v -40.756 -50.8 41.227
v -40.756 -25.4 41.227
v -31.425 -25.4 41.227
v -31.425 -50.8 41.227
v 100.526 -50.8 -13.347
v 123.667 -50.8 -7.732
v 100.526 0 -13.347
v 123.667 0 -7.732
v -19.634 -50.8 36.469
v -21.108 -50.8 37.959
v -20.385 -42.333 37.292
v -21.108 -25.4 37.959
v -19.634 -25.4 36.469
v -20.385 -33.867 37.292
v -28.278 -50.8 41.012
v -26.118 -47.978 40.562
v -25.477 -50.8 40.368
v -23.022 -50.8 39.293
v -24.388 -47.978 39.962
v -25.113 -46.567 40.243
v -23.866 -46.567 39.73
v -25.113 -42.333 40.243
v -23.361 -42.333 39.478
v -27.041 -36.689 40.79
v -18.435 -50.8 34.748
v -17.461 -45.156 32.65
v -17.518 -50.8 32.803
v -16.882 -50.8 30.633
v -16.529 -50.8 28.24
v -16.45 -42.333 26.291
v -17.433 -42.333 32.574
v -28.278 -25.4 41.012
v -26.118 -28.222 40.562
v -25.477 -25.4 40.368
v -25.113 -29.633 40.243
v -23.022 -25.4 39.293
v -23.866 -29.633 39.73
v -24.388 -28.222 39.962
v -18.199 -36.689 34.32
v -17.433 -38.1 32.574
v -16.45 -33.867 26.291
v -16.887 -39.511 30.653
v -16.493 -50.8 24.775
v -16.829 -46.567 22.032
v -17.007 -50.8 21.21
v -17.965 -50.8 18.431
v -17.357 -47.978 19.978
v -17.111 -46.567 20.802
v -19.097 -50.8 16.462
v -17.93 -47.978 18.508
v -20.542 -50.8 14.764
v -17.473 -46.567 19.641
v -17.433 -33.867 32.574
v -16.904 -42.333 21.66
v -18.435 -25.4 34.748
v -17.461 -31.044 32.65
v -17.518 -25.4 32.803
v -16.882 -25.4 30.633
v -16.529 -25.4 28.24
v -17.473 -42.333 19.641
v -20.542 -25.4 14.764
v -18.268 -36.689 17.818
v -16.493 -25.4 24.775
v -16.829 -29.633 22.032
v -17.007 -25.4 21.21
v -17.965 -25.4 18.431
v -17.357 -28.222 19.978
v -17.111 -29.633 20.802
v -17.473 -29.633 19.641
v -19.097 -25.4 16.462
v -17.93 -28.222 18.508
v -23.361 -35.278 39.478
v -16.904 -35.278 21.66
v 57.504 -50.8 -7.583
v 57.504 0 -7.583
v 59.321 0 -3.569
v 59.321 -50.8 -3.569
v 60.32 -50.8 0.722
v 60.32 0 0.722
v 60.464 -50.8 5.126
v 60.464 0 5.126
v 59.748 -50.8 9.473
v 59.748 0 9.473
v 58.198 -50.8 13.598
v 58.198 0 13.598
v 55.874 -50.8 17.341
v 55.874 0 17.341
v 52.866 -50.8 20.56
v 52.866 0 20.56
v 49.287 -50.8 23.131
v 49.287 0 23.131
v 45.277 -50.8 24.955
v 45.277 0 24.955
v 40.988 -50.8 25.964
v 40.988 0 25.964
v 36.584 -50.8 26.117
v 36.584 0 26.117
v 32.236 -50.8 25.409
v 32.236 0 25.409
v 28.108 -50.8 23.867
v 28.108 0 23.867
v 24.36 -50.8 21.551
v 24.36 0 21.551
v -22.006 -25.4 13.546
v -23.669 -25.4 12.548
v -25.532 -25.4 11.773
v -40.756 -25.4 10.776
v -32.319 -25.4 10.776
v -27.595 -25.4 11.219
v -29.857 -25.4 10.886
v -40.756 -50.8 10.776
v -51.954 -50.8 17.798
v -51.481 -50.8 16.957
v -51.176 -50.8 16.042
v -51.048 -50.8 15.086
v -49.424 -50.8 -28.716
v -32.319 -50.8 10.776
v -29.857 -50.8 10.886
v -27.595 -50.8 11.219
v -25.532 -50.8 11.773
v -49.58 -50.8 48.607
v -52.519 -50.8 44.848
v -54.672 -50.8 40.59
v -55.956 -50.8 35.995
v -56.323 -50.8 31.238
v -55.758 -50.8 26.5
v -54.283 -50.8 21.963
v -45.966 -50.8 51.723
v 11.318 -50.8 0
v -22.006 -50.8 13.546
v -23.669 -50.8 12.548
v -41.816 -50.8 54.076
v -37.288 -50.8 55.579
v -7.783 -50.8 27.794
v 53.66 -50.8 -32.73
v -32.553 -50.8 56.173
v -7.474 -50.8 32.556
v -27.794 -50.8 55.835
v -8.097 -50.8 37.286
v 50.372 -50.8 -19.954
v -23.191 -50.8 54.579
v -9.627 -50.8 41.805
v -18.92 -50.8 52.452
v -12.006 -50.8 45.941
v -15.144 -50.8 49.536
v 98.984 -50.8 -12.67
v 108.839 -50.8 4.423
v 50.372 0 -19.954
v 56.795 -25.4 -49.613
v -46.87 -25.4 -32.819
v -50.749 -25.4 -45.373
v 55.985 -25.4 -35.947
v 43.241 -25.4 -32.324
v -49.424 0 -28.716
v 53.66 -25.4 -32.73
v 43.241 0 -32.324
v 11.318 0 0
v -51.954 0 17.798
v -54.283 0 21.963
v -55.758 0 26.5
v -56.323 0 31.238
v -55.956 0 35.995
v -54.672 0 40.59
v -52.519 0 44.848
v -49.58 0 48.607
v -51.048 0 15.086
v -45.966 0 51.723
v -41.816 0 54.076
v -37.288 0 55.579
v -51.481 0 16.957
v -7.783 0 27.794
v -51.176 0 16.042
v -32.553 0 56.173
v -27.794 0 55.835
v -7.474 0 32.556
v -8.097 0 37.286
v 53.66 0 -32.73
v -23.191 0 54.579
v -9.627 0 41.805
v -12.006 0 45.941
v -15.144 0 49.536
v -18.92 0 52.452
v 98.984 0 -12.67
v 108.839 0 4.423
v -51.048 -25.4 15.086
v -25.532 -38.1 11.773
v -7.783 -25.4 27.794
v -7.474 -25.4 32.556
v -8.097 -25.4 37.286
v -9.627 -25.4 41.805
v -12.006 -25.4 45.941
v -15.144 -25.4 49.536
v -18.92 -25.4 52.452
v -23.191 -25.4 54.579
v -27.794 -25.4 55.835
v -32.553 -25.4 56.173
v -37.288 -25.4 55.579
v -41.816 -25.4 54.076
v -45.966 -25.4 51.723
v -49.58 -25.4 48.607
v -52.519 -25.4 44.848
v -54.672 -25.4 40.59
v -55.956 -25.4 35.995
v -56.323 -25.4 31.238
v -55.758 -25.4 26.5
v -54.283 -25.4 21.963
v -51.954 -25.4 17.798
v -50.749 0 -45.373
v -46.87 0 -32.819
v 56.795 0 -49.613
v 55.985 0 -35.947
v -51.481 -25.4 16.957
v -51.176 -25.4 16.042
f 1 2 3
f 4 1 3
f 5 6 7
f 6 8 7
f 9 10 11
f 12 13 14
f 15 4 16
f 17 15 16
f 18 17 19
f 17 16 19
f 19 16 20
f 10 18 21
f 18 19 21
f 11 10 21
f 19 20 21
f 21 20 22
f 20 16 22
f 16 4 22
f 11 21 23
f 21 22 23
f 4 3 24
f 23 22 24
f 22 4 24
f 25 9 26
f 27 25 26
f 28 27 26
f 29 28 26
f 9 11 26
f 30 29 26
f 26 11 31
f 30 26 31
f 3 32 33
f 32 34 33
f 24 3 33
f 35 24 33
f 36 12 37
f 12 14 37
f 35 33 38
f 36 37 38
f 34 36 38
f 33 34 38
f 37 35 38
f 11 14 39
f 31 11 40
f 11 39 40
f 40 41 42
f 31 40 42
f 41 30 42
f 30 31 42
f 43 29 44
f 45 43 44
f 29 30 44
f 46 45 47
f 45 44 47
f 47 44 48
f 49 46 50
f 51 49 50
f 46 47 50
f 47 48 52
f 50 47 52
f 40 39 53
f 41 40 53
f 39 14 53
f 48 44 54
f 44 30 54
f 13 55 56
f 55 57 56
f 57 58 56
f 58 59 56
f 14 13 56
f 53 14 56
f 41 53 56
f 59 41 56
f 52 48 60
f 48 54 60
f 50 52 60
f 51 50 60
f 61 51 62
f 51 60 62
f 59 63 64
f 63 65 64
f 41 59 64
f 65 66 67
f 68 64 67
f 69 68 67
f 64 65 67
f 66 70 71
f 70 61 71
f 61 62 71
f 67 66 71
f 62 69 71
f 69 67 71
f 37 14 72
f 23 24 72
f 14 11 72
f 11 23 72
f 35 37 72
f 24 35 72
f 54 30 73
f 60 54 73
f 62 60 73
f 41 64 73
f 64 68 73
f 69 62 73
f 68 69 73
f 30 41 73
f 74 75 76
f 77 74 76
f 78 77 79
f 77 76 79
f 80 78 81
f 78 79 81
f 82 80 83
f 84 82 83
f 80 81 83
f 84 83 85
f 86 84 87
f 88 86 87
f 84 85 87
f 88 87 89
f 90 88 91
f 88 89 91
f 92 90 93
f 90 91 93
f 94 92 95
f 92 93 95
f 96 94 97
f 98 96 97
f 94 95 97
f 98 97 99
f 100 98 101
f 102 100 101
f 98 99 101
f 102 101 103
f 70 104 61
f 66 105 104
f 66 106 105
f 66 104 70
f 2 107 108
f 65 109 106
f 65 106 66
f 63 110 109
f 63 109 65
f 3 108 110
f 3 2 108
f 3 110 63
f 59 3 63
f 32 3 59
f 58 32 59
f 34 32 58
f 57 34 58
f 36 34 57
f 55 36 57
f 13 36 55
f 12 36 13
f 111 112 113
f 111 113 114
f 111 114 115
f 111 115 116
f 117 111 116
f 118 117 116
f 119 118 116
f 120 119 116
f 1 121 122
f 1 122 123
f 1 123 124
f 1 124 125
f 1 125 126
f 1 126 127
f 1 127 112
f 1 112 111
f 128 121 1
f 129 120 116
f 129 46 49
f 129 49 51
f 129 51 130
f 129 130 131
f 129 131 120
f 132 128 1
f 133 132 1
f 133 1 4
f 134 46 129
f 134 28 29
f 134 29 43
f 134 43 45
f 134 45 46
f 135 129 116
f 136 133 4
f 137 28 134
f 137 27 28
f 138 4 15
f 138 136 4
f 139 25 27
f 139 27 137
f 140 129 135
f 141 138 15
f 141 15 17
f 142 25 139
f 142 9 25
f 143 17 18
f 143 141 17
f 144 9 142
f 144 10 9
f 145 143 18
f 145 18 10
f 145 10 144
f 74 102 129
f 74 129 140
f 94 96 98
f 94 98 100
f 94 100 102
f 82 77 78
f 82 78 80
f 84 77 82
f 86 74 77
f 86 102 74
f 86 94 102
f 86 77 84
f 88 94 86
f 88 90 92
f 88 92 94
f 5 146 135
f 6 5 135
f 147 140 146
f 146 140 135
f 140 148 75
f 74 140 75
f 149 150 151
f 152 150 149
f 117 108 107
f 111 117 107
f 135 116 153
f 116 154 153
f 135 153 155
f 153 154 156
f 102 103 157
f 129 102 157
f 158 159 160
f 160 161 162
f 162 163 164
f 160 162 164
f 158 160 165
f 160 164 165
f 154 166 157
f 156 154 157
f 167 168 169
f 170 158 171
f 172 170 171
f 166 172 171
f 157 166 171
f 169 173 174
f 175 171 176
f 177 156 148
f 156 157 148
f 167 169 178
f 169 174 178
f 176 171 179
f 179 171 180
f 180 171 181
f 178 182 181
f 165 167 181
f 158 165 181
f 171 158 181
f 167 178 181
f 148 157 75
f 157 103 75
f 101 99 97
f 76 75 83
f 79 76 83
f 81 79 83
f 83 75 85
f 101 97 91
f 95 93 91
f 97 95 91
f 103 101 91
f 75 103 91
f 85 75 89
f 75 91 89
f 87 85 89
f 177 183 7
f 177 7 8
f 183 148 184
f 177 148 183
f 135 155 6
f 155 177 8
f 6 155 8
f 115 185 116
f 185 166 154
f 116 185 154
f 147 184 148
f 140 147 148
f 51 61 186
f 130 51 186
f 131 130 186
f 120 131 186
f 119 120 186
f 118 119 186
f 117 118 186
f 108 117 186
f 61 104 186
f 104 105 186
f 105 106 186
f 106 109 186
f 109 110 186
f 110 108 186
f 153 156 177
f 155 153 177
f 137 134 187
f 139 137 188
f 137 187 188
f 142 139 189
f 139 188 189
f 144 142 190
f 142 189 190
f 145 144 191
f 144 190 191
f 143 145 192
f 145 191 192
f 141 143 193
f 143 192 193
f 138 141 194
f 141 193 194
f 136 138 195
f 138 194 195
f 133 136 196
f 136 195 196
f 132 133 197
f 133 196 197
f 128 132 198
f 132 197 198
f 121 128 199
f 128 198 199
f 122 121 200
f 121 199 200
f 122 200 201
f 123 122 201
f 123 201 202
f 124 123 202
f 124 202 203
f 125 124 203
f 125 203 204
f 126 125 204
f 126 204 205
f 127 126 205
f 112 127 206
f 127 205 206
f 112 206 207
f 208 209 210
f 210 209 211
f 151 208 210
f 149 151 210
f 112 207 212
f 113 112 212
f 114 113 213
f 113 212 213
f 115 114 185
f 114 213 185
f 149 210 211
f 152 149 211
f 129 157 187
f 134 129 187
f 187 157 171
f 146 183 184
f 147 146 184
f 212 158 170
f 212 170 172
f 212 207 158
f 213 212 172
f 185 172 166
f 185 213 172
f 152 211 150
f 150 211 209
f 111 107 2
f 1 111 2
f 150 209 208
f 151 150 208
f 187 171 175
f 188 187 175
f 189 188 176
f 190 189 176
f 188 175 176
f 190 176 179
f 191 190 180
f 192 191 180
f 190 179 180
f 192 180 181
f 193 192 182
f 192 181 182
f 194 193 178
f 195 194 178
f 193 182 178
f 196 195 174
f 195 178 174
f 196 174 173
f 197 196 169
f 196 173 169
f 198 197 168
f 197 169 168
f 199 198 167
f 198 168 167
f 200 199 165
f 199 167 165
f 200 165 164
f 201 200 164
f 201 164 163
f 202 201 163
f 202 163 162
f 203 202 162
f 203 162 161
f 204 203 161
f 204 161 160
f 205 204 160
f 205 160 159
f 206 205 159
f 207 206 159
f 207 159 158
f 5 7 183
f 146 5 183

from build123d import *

# Parameters (mm, degrees)
F1_DEPTH = 25.4
F3_DEPTH = 25.4
F4_R     = 5.08
F6_DEPTH = 25.4


with BuildPart() as f1:
    # F0 (on Front) → F1 (new body)
    with BuildSketch(Plane.XZ):
        Polygon((50.3724894897, -19.9537337418), (43.2405746432, -32.324386227), (53.6602549255, -32.7301882207), (123.6672028899, -7.7317771502), (100.5261093378, -13.3468965068), (98.9843588805, -12.6695925823), (108.838506043, 4.4229039922), align=None)
        with BuildLine():
            Line((11.317721568, 0), (-7.7830348164, 27.7942810208))
            ThreePointArc((-7.7830348164, 27.7942810208), (-37.9805600242, 55.411449094), (-51.1065535247, 16.6518464684))
            Line((-51.1065535247, 16.6518464684), (-49.4236677809, -28.7155102049))
            Line((-49.4236677809, -28.7155102049), (43.2405746432, -32.324386227))
            Line((43.2405746432, -32.324386227), (50.3724894897, -19.9537337418))
            Line((50.3724894897, -19.9537337418), (57.5044043362, -7.5830812566))
            ThreePointArc((57.5044043362, -7.5830812566), (52.8655426417, 20.5599650278), (24.3599712849, 21.5511731803))
            Line((24.3599712849, 21.5511731803), (11.317721568, 0))
        make_face()
    extrude(amount=F1_DEPTH)

    # F4
    f4_edges = [f1.edges().sort_by_distance(p)[0] for p in [
        (-51.106554, -12.7, 16.651846),
    ]]
    fillet(f4_edges, radius=F4_R)

    # F5 (on face) → F6 (join)
    with BuildSketch(Plane.XZ.offset(25.4)):
        with BuildLine():
            Line((11.317721568, 0), (-7.7830348164, 27.7942810208))
            ThreePointArc((-7.7830348164, 27.7942810208), (-37.2875983405, 55.5789337589), (-51.9543250562, 17.7980745313))
            ThreePointArc((-51.9543250562, 17.7980745313), (-51.306649694, 16.5071018213), (-51.0484702296, 15.08603276))
            Line((-51.0484702296, 15.08603276), (-49.4236677809, -28.7155102049))
            Line((-49.4236677809, -28.7155102049), (53.6602549255, -32.7301882207))
            Line((53.6602549255, -32.7301882207), (123.6672028899, -7.7317771502))
            Line((123.6672028899, -7.7317771502), (100.5261093378, -13.3468965068))
            Line((100.5261093378, -13.3468965068), (98.9843588805, -12.6695925823))
            Line((98.9843588805, -12.6695925823), (108.838506043, 4.4229039922))
            Line((108.838506043, 4.4229039922), (50.3724894897, -19.9537337418))
            Line((50.3724894897, -19.9537337418), (57.5044043362, -7.5830812566))
            ThreePointArc((57.5044043362, -7.5830812566), (52.8655426417, 20.5599650278), (24.3599712849, 21.5511731803))
            Line((24.3599712849, 21.5511731803), (11.317721568, 0))
        make_face()
        with BuildLine():
            add(Edge.make_bspline(
                [(-20.3851701657, 37.291638983), (-16.4495841564, 33.3560529737), (-16.4495841564, 26.2913261831)],
                knots=[0, 0, 0, 1, 1, 1], degree=2))
            add(Edge.make_bspline(
                [(-16.4495841564, 26.2913261831), (-16.4495841564, 18.7533959943), (-20.5417938256, 14.7644912922)],
                knots=[0, 0, 0, 1, 1, 1], degree=2))
            add(Edge.make_bspline(
                [(-20.5417938256, 14.7644912922), (-24.6340034949, 10.7755865902), (-32.3185600888, 10.7755865902)],
                knots=[0, 0, 0, 1, 1, 1], degree=2))
            Line((-32.3185600888, 10.7755865902), (-40.756243218, 10.7755865902))
            Line((-40.756243218, 10.7755865902), (-40.756243218, 41.2272249923))
            Line((-40.756243218, 41.2272249923), (-31.4254719851, 41.2272249923))
            add(Edge.make_bspline(
                [(-31.4254719851, 41.2272249923), (-24.320756175, 41.2272249923), (-20.3851701657, 37.291638983)],
                knots=[0, 0, 0, 1, 1, 1], degree=2))
        make_face(mode=Mode.SUBTRACT)
    extrude(amount=F6_DEPTH)


with BuildPart() as f3:
    # F2 (on Front) → F3 (new body)
    with BuildSketch(Plane.XZ):
        Polygon((55.984955281, -35.9467826784), (-46.8695536256, -32.8190922737), (-50.7489927113, -45.372504741), (56.7951351404, -49.6126748621), align=None)
    extrude(amount=F3_DEPTH)


solid = Compound([f1.part, f3.part])
